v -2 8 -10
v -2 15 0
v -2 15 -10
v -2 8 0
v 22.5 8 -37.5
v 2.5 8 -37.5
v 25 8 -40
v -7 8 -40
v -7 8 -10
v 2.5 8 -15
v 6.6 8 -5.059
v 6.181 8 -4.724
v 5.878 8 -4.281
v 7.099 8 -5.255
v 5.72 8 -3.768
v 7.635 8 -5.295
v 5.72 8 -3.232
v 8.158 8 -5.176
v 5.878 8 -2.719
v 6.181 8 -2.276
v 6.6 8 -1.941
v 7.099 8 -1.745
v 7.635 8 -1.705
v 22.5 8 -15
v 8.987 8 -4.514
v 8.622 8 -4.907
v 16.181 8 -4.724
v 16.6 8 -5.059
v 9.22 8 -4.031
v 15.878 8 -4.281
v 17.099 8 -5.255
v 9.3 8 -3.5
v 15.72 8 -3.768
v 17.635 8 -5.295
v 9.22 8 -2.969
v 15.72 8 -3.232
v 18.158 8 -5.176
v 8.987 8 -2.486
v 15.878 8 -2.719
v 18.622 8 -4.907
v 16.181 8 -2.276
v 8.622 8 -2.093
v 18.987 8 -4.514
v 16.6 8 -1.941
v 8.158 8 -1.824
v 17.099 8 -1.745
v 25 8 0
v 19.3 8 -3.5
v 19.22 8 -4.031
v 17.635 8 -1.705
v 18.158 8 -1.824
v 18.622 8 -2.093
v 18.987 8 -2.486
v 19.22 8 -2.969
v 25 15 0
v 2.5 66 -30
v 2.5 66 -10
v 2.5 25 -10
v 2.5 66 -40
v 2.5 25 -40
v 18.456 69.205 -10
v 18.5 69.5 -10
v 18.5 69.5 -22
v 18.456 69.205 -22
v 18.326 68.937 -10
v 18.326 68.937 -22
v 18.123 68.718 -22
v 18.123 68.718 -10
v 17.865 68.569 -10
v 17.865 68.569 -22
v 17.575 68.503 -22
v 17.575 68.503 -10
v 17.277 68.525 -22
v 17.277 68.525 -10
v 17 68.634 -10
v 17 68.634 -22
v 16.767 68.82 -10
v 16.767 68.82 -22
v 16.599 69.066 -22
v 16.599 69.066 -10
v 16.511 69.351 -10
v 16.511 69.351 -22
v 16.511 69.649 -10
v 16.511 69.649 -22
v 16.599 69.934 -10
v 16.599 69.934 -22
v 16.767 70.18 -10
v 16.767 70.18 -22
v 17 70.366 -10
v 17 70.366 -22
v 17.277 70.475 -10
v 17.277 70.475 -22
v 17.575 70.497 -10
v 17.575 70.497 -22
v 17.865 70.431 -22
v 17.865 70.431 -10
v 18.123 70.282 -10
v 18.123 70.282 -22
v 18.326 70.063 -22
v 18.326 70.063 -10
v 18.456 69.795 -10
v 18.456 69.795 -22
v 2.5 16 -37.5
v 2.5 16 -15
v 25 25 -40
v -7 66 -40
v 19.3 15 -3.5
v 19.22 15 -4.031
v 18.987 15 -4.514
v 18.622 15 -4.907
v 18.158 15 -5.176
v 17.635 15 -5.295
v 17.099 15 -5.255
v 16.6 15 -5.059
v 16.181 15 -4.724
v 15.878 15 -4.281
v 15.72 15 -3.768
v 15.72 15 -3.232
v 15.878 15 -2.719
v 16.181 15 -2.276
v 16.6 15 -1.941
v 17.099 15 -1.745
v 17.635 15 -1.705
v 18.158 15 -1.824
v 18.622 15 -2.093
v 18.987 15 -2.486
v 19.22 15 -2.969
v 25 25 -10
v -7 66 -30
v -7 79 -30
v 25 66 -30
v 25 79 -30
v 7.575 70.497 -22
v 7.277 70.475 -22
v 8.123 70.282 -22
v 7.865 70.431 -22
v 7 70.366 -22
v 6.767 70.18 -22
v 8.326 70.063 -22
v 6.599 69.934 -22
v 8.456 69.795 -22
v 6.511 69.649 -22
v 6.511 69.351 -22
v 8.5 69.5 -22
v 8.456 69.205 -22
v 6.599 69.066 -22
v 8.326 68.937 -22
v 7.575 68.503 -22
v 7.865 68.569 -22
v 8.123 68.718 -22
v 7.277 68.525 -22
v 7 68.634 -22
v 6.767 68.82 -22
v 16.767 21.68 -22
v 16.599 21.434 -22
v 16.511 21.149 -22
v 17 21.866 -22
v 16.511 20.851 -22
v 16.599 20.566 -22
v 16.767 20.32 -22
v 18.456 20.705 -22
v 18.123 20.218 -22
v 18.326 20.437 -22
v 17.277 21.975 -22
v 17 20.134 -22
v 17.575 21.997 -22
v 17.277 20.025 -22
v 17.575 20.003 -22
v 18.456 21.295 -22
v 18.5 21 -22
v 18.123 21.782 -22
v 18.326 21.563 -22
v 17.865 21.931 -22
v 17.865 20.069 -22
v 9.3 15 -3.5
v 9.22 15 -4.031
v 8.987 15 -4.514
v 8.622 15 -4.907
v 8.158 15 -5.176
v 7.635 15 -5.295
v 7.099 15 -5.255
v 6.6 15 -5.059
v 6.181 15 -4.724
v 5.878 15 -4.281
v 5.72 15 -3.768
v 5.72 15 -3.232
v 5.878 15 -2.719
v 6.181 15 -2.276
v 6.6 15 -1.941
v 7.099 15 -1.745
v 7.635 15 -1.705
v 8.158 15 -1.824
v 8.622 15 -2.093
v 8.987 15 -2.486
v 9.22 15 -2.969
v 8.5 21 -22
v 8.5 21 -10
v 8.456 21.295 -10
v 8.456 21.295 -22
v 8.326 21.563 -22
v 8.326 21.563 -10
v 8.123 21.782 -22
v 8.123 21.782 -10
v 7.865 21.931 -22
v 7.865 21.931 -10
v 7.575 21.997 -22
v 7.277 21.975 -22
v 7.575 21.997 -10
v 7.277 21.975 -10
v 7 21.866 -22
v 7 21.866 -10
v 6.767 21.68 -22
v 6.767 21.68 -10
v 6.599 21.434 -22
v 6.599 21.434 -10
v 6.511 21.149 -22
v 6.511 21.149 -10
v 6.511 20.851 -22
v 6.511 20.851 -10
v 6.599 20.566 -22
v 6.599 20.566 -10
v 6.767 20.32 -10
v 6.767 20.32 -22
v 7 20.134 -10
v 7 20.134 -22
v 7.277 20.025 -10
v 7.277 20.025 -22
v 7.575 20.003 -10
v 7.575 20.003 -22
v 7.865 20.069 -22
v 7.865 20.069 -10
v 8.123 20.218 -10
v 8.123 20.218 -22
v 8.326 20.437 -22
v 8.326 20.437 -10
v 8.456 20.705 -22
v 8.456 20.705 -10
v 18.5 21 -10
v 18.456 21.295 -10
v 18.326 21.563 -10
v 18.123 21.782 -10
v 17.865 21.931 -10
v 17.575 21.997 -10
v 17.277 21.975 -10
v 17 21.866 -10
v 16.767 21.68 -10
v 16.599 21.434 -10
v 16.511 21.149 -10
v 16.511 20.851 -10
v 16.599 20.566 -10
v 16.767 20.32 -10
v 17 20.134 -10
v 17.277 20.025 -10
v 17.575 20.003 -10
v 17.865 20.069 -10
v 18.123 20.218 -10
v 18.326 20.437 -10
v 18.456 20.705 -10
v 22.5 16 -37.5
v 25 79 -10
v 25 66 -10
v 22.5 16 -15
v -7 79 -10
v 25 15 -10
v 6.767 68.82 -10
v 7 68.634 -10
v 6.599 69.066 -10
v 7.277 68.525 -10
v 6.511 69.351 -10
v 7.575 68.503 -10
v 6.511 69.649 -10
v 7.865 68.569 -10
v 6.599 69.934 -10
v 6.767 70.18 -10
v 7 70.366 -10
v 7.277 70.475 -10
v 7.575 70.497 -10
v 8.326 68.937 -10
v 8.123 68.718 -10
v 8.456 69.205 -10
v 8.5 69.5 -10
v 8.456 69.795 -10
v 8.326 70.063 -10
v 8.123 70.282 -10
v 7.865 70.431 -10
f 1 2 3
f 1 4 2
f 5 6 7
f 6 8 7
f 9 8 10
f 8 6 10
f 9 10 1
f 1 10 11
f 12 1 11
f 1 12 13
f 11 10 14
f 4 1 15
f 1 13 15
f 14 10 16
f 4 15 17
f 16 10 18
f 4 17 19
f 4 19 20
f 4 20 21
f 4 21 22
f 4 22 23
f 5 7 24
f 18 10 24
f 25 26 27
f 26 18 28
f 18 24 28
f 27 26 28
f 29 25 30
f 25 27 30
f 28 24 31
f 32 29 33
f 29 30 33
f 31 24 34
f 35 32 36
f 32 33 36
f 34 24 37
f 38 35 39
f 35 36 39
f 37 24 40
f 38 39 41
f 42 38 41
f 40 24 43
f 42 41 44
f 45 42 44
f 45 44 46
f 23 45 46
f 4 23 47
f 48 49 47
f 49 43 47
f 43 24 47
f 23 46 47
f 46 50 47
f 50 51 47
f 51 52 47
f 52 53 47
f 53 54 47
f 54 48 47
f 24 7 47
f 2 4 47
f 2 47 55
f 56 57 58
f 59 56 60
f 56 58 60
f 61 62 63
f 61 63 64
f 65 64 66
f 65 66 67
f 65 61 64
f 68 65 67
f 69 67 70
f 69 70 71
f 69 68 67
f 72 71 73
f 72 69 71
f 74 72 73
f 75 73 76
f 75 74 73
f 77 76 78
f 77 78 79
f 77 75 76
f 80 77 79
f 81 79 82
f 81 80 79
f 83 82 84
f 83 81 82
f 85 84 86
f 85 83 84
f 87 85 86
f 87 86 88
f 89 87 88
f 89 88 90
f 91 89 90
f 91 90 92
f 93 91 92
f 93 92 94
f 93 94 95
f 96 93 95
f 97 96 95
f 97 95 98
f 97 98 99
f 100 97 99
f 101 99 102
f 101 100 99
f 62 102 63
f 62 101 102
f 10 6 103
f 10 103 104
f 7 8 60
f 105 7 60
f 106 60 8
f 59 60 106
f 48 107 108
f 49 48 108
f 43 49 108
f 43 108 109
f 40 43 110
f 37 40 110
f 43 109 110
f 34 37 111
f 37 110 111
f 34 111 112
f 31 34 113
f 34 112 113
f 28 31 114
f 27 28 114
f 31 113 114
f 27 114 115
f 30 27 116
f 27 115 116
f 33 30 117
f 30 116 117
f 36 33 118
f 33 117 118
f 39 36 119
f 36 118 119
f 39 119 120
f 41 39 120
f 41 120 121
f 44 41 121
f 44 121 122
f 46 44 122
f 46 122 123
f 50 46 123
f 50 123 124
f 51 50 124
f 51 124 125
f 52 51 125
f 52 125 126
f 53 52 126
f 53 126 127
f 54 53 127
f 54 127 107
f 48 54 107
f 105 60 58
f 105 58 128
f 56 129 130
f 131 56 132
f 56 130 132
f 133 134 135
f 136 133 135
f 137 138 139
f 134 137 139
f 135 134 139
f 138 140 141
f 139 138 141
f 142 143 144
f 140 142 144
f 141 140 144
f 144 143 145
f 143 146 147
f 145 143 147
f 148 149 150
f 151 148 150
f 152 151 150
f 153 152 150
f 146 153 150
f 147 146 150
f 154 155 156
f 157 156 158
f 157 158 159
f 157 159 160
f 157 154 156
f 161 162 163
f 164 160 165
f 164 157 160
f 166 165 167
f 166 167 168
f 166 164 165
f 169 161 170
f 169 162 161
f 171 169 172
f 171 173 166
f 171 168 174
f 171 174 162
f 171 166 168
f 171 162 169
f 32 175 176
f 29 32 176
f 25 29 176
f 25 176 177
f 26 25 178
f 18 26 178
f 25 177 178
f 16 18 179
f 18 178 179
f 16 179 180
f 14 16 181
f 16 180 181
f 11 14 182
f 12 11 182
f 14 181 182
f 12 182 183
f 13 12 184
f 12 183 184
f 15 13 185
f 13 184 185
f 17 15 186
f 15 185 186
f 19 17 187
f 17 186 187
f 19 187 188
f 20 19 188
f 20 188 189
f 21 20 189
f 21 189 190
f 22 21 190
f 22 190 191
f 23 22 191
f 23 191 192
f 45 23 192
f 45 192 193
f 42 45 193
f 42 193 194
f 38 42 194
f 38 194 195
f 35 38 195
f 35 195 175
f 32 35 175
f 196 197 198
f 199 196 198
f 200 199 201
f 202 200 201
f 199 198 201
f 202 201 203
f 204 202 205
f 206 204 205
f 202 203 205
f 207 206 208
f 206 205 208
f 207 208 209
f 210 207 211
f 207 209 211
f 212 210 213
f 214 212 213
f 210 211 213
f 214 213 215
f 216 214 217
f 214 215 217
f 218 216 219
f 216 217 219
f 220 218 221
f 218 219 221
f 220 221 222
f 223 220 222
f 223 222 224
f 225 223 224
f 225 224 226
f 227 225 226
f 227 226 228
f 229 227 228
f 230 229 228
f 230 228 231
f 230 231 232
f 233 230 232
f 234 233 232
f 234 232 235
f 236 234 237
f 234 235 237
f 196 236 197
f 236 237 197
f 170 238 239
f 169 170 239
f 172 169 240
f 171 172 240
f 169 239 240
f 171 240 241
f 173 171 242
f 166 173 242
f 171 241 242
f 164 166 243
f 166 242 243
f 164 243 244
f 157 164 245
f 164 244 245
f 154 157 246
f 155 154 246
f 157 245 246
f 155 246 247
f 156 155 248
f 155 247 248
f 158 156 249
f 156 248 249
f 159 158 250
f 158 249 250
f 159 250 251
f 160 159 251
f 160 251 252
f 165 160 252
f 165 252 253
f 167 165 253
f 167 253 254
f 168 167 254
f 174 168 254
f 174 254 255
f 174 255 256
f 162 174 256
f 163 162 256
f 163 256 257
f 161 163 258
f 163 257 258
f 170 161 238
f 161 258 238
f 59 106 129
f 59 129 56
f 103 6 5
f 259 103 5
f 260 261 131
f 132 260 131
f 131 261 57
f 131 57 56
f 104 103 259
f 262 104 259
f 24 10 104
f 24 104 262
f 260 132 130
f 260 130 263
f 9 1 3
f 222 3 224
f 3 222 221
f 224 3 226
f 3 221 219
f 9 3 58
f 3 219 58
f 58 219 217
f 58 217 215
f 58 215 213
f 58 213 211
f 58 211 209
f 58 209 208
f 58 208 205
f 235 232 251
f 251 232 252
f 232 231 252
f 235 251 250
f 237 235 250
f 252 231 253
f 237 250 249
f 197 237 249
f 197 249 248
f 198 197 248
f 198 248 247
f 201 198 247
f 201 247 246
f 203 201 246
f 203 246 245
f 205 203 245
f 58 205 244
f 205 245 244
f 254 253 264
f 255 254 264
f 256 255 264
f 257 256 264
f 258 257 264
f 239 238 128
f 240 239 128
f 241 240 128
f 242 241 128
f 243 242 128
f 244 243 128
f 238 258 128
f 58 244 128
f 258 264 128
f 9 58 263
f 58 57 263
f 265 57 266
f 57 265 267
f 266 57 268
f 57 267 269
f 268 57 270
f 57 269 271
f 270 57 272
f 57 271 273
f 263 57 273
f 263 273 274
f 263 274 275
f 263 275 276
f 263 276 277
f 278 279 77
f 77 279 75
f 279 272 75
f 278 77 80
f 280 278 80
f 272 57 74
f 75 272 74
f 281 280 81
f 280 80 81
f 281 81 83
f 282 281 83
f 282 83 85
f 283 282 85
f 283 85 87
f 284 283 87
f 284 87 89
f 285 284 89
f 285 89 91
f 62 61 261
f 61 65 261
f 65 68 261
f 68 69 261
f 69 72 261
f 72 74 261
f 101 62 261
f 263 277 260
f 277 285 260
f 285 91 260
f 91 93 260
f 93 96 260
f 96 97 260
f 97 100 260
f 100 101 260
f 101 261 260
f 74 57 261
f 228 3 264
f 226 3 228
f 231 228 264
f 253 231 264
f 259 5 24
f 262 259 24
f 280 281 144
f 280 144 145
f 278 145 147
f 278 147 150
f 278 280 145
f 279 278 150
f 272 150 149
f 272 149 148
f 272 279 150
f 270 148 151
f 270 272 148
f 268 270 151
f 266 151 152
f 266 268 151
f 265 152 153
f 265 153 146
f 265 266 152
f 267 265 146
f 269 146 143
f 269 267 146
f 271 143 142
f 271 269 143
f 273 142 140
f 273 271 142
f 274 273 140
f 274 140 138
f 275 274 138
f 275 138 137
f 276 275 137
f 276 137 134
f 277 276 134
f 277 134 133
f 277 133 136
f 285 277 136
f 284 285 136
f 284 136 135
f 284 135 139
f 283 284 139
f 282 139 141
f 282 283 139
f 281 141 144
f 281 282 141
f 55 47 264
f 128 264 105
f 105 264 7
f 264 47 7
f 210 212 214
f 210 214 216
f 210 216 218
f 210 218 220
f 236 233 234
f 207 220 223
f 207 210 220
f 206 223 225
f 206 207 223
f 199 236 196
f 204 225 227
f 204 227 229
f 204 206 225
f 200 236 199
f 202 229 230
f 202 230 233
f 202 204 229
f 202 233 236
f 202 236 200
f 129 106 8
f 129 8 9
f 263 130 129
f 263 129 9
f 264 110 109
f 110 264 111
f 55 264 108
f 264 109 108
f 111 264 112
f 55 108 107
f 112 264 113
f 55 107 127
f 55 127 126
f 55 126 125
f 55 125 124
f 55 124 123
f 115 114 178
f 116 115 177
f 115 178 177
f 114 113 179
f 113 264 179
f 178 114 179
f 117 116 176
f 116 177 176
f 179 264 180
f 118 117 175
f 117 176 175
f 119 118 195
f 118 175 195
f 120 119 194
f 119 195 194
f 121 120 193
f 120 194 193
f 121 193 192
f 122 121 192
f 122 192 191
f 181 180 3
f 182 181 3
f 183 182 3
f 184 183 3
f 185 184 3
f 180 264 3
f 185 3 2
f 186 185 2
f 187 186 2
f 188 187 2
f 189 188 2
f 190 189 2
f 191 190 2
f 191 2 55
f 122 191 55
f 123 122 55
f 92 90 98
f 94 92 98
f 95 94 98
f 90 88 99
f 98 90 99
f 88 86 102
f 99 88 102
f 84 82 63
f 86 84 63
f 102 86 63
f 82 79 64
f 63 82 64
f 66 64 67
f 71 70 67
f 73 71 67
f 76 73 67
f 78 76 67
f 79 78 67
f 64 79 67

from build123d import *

# Parameters (mm, degrees)
SKETCH1_W           = 25
SKETCH1_H           = 40
BOSS_EXTRUDE1_DEPTH = 50
SKETCH2_W           = 22.5
SKETCH2_H           = 40
CUT_EXTRUDE1_DEPTH  = 25
SKETCH3_W           = 20
SKETCH3_H           = 10
CUT_EXTRUDE2_DEPTH  = 10
SKETCH5_R           = 1
CUT_EXTRUDE4_DEPTH  = 12
SKETCH6_W           = 25
SKETCH6_H           = 40
CUT_EXTRUDE5_DEPTH  = 8
SKETCH7_W           = 20
SKETCH7_H           = 22.5
CUT_EXTRUDE6_DEPTH  = 8
SKETCH8_R           = 1.8
CUT_EXTRUDE7_DEPTH  = 8
SKETCH12_W          = 10
SKETCH12_H          = 10
CUT_EXTRUDE9_DEPTH  = 10
SKETCH13_W          = 2.5
SKETCH13_H          = 40
BOSS_EXTRUDE2_DEPTH = 19
SKETCH14_W          = 40
SKETCH14_H          = 61
BOSS_EXTRUDE3_DEPTH = 2
SKETCH15_W          = 40
SKETCH15_H          = 3
BOSS_EXTRUDE4_DEPTH = 22.5
SKETCH16_W          = 10
SKETCH16_H          = 3
CUT_EXTRUDE10_DEPTH = 22.5
SKETCH17_W          = 10
SKETCH17_H          = 54
CUT_EXTRUDE11_DEPTH = 5.5
SKETCH18_W          = 27
SKETCH18_H          = 30
BOSS_EXTRUDE5_DEPTH = 10
SKETCH19_W          = 30
SKETCH19_H          = 71
BOSS_EXTRUDE6_DEPTH = 5
SKETCH20_W          = 32
SKETCH20_H          = 10
CUT_EXTRUDE12_DEPTH = 13


with BuildPart() as part:
    # Sketch1 → Boss-Extrude1 (new body)
    with BuildSketch(Plane(origin=(0, 0, 0), x_dir=(1, 0, 0), z_dir=(0, 1, 0))):
        with Locations((12.5, 20)):
            Rectangle(SKETCH1_W, SKETCH1_H)
    extrude(amount=BOSS_EXTRUDE1_DEPTH)

    # Sketch2 → Cut-Extrude1 (cut)
    with BuildSketch(Plane(origin=(0, 50, 0), x_dir=(1, 0, 0), z_dir=(0, 1, 0))):
        with Locations((13.75, 20)):
            Rectangle(SKETCH2_W, SKETCH2_H)
    extrude(amount=-CUT_EXTRUDE1_DEPTH, mode=Mode.SUBTRACT)

    # Sketch3 → Cut-Extrude2 (cut)
    with BuildSketch(Plane.XY):
        with Locations((12.5, 20)):
            Rectangle(SKETCH3_W, SKETCH3_H)
    extrude(amount=-CUT_EXTRUDE2_DEPTH, mode=Mode.SUBTRACT)

    # Sketch5 → Cut-Extrude4 (cut)
    with BuildSketch(Plane.XY.offset(-10)):
        with Locations((7.5, 21)):
            Circle(SKETCH5_R)
        with Locations((17.5, 21)):
            Circle(SKETCH5_R)
    cut_extrude4 = extrude(amount=-CUT_EXTRUDE4_DEPTH, mode=Mode.SUBTRACT)

    # Sketch6 → Cut-Extrude5 (cut)
    with BuildSketch(Plane.XZ):
        with Locations((12.5, -20)):
            Rectangle(SKETCH6_W, SKETCH6_H)
    extrude(amount=-CUT_EXTRUDE5_DEPTH, mode=Mode.SUBTRACT)

    # Sketch7 → Cut-Extrude6 (cut)
    with BuildSketch(Plane.XZ.offset(-8)):
        with Locations((12.5, -26.25)):
            Rectangle(SKETCH7_W, SKETCH7_H)
    extrude(amount=-CUT_EXTRUDE6_DEPTH, mode=Mode.SUBTRACT)

    # Sketch8 → Cut-Extrude7 (cut, through all)
    with BuildSketch(Plane(origin=(0, 15, 0), x_dir=(1, 0, 0), z_dir=(0, 1, 0))):
        with Locations((7.5, 3.5)):
            Circle(SKETCH8_R)
        with Locations((17.5, 3.5)):
            Circle(SKETCH8_R)
    extrude(amount=-CUT_EXTRUDE7_DEPTH, mode=Mode.SUBTRACT)

    # Sketch12 → Cut-Extrude9 (cut)
    with BuildSketch(Plane.ZY.offset(-22.5)):
        with Locations((-5, 20)):
            Rectangle(SKETCH12_W, SKETCH12_H)
    extrude(amount=-CUT_EXTRUDE9_DEPTH, mode=Mode.SUBTRACT)

    # Sketch13 → Boss-Extrude2 (add)
    with BuildSketch(Plane(origin=(0, 50, 0), x_dir=(1, 0, 0), z_dir=(0, 1, 0))):
        with Locations((1.25, 20)):
            Rectangle(SKETCH13_W, SKETCH13_H)
    extrude(amount=BOSS_EXTRUDE2_DEPTH)

    # Sketch14 → Boss-Extrude3 (add)
    with BuildSketch(Plane.ZY):
        with Locations((-20, 38.5)):
            Rectangle(SKETCH14_W, SKETCH14_H)
    extrude(amount=BOSS_EXTRUDE3_DEPTH)

    # Sketch15 → Boss-Extrude4 (add)
    with BuildSketch(Plane(origin=(2.5, 0, 0), x_dir=(0, 0, -1), z_dir=(1, 0, 0))):
        with Locations((20, 67.5)):
            Rectangle(SKETCH15_W, SKETCH15_H)
    extrude(amount=BOSS_EXTRUDE4_DEPTH)

    # Sketch16 → Cut-Extrude10 (cut)
    with BuildSketch(Plane(origin=(25, 0, 0), x_dir=(0, 0, -1), z_dir=(1, 0, 0))):
        with Locations((5, 67.5)):
            Rectangle(SKETCH16_W, SKETCH16_H)
    extrude(amount=-CUT_EXTRUDE10_DEPTH, mode=Mode.SUBTRACT)

    # Sketch17 → Cut-Extrude11 (cut, through all)
    with BuildSketch(Plane(origin=(2.5, 0, 0), x_dir=(0, 0, -1), z_dir=(1, 0, 0))):
        with Locations((5, 42)):
            Rectangle(SKETCH17_W, SKETCH17_H)
    extrude(amount=-CUT_EXTRUDE11_DEPTH, mode=Mode.SUBTRACT)

    # Sketch18 → Boss-Extrude5 (add)
    with BuildSketch(Plane(origin=(0, 69, 0), x_dir=(1, 0, 0), z_dir=(0, 1, 0))):
        with Locations((11.5, 25)):
            Rectangle(SKETCH18_W, SKETCH18_H)
    extrude(amount=BOSS_EXTRUDE5_DEPTH)

    # Mirror1: Cut-Extrude4 across plane
    add(cut_extrude4.mirror(Plane(origin=(0, 45.25, 0), x_dir=(0, 0, 1), z_dir=(0, -1, 0))), mode=Mode.SUBTRACT)

    # Sketch19 → Boss-Extrude6 (add)
    with BuildSketch(Plane.ZY.offset(2)):
        with Locations((-25, 43.5)):
            Rectangle(SKETCH19_W, SKETCH19_H)
    extrude(amount=BOSS_EXTRUDE6_DEPTH)

    # Sketch20 → Cut-Extrude12 (cut)
    with BuildSketch(Plane(origin=(0, 79, 0), x_dir=(1, 0, 0), z_dir=(0, 1, 0))):
        with Locations((9, 35)):
            Rectangle(SKETCH20_W, SKETCH20_H)
    extrude(amount=-CUT_EXTRUDE12_DEPTH, mode=Mode.SUBTRACT)


solid = part.part
